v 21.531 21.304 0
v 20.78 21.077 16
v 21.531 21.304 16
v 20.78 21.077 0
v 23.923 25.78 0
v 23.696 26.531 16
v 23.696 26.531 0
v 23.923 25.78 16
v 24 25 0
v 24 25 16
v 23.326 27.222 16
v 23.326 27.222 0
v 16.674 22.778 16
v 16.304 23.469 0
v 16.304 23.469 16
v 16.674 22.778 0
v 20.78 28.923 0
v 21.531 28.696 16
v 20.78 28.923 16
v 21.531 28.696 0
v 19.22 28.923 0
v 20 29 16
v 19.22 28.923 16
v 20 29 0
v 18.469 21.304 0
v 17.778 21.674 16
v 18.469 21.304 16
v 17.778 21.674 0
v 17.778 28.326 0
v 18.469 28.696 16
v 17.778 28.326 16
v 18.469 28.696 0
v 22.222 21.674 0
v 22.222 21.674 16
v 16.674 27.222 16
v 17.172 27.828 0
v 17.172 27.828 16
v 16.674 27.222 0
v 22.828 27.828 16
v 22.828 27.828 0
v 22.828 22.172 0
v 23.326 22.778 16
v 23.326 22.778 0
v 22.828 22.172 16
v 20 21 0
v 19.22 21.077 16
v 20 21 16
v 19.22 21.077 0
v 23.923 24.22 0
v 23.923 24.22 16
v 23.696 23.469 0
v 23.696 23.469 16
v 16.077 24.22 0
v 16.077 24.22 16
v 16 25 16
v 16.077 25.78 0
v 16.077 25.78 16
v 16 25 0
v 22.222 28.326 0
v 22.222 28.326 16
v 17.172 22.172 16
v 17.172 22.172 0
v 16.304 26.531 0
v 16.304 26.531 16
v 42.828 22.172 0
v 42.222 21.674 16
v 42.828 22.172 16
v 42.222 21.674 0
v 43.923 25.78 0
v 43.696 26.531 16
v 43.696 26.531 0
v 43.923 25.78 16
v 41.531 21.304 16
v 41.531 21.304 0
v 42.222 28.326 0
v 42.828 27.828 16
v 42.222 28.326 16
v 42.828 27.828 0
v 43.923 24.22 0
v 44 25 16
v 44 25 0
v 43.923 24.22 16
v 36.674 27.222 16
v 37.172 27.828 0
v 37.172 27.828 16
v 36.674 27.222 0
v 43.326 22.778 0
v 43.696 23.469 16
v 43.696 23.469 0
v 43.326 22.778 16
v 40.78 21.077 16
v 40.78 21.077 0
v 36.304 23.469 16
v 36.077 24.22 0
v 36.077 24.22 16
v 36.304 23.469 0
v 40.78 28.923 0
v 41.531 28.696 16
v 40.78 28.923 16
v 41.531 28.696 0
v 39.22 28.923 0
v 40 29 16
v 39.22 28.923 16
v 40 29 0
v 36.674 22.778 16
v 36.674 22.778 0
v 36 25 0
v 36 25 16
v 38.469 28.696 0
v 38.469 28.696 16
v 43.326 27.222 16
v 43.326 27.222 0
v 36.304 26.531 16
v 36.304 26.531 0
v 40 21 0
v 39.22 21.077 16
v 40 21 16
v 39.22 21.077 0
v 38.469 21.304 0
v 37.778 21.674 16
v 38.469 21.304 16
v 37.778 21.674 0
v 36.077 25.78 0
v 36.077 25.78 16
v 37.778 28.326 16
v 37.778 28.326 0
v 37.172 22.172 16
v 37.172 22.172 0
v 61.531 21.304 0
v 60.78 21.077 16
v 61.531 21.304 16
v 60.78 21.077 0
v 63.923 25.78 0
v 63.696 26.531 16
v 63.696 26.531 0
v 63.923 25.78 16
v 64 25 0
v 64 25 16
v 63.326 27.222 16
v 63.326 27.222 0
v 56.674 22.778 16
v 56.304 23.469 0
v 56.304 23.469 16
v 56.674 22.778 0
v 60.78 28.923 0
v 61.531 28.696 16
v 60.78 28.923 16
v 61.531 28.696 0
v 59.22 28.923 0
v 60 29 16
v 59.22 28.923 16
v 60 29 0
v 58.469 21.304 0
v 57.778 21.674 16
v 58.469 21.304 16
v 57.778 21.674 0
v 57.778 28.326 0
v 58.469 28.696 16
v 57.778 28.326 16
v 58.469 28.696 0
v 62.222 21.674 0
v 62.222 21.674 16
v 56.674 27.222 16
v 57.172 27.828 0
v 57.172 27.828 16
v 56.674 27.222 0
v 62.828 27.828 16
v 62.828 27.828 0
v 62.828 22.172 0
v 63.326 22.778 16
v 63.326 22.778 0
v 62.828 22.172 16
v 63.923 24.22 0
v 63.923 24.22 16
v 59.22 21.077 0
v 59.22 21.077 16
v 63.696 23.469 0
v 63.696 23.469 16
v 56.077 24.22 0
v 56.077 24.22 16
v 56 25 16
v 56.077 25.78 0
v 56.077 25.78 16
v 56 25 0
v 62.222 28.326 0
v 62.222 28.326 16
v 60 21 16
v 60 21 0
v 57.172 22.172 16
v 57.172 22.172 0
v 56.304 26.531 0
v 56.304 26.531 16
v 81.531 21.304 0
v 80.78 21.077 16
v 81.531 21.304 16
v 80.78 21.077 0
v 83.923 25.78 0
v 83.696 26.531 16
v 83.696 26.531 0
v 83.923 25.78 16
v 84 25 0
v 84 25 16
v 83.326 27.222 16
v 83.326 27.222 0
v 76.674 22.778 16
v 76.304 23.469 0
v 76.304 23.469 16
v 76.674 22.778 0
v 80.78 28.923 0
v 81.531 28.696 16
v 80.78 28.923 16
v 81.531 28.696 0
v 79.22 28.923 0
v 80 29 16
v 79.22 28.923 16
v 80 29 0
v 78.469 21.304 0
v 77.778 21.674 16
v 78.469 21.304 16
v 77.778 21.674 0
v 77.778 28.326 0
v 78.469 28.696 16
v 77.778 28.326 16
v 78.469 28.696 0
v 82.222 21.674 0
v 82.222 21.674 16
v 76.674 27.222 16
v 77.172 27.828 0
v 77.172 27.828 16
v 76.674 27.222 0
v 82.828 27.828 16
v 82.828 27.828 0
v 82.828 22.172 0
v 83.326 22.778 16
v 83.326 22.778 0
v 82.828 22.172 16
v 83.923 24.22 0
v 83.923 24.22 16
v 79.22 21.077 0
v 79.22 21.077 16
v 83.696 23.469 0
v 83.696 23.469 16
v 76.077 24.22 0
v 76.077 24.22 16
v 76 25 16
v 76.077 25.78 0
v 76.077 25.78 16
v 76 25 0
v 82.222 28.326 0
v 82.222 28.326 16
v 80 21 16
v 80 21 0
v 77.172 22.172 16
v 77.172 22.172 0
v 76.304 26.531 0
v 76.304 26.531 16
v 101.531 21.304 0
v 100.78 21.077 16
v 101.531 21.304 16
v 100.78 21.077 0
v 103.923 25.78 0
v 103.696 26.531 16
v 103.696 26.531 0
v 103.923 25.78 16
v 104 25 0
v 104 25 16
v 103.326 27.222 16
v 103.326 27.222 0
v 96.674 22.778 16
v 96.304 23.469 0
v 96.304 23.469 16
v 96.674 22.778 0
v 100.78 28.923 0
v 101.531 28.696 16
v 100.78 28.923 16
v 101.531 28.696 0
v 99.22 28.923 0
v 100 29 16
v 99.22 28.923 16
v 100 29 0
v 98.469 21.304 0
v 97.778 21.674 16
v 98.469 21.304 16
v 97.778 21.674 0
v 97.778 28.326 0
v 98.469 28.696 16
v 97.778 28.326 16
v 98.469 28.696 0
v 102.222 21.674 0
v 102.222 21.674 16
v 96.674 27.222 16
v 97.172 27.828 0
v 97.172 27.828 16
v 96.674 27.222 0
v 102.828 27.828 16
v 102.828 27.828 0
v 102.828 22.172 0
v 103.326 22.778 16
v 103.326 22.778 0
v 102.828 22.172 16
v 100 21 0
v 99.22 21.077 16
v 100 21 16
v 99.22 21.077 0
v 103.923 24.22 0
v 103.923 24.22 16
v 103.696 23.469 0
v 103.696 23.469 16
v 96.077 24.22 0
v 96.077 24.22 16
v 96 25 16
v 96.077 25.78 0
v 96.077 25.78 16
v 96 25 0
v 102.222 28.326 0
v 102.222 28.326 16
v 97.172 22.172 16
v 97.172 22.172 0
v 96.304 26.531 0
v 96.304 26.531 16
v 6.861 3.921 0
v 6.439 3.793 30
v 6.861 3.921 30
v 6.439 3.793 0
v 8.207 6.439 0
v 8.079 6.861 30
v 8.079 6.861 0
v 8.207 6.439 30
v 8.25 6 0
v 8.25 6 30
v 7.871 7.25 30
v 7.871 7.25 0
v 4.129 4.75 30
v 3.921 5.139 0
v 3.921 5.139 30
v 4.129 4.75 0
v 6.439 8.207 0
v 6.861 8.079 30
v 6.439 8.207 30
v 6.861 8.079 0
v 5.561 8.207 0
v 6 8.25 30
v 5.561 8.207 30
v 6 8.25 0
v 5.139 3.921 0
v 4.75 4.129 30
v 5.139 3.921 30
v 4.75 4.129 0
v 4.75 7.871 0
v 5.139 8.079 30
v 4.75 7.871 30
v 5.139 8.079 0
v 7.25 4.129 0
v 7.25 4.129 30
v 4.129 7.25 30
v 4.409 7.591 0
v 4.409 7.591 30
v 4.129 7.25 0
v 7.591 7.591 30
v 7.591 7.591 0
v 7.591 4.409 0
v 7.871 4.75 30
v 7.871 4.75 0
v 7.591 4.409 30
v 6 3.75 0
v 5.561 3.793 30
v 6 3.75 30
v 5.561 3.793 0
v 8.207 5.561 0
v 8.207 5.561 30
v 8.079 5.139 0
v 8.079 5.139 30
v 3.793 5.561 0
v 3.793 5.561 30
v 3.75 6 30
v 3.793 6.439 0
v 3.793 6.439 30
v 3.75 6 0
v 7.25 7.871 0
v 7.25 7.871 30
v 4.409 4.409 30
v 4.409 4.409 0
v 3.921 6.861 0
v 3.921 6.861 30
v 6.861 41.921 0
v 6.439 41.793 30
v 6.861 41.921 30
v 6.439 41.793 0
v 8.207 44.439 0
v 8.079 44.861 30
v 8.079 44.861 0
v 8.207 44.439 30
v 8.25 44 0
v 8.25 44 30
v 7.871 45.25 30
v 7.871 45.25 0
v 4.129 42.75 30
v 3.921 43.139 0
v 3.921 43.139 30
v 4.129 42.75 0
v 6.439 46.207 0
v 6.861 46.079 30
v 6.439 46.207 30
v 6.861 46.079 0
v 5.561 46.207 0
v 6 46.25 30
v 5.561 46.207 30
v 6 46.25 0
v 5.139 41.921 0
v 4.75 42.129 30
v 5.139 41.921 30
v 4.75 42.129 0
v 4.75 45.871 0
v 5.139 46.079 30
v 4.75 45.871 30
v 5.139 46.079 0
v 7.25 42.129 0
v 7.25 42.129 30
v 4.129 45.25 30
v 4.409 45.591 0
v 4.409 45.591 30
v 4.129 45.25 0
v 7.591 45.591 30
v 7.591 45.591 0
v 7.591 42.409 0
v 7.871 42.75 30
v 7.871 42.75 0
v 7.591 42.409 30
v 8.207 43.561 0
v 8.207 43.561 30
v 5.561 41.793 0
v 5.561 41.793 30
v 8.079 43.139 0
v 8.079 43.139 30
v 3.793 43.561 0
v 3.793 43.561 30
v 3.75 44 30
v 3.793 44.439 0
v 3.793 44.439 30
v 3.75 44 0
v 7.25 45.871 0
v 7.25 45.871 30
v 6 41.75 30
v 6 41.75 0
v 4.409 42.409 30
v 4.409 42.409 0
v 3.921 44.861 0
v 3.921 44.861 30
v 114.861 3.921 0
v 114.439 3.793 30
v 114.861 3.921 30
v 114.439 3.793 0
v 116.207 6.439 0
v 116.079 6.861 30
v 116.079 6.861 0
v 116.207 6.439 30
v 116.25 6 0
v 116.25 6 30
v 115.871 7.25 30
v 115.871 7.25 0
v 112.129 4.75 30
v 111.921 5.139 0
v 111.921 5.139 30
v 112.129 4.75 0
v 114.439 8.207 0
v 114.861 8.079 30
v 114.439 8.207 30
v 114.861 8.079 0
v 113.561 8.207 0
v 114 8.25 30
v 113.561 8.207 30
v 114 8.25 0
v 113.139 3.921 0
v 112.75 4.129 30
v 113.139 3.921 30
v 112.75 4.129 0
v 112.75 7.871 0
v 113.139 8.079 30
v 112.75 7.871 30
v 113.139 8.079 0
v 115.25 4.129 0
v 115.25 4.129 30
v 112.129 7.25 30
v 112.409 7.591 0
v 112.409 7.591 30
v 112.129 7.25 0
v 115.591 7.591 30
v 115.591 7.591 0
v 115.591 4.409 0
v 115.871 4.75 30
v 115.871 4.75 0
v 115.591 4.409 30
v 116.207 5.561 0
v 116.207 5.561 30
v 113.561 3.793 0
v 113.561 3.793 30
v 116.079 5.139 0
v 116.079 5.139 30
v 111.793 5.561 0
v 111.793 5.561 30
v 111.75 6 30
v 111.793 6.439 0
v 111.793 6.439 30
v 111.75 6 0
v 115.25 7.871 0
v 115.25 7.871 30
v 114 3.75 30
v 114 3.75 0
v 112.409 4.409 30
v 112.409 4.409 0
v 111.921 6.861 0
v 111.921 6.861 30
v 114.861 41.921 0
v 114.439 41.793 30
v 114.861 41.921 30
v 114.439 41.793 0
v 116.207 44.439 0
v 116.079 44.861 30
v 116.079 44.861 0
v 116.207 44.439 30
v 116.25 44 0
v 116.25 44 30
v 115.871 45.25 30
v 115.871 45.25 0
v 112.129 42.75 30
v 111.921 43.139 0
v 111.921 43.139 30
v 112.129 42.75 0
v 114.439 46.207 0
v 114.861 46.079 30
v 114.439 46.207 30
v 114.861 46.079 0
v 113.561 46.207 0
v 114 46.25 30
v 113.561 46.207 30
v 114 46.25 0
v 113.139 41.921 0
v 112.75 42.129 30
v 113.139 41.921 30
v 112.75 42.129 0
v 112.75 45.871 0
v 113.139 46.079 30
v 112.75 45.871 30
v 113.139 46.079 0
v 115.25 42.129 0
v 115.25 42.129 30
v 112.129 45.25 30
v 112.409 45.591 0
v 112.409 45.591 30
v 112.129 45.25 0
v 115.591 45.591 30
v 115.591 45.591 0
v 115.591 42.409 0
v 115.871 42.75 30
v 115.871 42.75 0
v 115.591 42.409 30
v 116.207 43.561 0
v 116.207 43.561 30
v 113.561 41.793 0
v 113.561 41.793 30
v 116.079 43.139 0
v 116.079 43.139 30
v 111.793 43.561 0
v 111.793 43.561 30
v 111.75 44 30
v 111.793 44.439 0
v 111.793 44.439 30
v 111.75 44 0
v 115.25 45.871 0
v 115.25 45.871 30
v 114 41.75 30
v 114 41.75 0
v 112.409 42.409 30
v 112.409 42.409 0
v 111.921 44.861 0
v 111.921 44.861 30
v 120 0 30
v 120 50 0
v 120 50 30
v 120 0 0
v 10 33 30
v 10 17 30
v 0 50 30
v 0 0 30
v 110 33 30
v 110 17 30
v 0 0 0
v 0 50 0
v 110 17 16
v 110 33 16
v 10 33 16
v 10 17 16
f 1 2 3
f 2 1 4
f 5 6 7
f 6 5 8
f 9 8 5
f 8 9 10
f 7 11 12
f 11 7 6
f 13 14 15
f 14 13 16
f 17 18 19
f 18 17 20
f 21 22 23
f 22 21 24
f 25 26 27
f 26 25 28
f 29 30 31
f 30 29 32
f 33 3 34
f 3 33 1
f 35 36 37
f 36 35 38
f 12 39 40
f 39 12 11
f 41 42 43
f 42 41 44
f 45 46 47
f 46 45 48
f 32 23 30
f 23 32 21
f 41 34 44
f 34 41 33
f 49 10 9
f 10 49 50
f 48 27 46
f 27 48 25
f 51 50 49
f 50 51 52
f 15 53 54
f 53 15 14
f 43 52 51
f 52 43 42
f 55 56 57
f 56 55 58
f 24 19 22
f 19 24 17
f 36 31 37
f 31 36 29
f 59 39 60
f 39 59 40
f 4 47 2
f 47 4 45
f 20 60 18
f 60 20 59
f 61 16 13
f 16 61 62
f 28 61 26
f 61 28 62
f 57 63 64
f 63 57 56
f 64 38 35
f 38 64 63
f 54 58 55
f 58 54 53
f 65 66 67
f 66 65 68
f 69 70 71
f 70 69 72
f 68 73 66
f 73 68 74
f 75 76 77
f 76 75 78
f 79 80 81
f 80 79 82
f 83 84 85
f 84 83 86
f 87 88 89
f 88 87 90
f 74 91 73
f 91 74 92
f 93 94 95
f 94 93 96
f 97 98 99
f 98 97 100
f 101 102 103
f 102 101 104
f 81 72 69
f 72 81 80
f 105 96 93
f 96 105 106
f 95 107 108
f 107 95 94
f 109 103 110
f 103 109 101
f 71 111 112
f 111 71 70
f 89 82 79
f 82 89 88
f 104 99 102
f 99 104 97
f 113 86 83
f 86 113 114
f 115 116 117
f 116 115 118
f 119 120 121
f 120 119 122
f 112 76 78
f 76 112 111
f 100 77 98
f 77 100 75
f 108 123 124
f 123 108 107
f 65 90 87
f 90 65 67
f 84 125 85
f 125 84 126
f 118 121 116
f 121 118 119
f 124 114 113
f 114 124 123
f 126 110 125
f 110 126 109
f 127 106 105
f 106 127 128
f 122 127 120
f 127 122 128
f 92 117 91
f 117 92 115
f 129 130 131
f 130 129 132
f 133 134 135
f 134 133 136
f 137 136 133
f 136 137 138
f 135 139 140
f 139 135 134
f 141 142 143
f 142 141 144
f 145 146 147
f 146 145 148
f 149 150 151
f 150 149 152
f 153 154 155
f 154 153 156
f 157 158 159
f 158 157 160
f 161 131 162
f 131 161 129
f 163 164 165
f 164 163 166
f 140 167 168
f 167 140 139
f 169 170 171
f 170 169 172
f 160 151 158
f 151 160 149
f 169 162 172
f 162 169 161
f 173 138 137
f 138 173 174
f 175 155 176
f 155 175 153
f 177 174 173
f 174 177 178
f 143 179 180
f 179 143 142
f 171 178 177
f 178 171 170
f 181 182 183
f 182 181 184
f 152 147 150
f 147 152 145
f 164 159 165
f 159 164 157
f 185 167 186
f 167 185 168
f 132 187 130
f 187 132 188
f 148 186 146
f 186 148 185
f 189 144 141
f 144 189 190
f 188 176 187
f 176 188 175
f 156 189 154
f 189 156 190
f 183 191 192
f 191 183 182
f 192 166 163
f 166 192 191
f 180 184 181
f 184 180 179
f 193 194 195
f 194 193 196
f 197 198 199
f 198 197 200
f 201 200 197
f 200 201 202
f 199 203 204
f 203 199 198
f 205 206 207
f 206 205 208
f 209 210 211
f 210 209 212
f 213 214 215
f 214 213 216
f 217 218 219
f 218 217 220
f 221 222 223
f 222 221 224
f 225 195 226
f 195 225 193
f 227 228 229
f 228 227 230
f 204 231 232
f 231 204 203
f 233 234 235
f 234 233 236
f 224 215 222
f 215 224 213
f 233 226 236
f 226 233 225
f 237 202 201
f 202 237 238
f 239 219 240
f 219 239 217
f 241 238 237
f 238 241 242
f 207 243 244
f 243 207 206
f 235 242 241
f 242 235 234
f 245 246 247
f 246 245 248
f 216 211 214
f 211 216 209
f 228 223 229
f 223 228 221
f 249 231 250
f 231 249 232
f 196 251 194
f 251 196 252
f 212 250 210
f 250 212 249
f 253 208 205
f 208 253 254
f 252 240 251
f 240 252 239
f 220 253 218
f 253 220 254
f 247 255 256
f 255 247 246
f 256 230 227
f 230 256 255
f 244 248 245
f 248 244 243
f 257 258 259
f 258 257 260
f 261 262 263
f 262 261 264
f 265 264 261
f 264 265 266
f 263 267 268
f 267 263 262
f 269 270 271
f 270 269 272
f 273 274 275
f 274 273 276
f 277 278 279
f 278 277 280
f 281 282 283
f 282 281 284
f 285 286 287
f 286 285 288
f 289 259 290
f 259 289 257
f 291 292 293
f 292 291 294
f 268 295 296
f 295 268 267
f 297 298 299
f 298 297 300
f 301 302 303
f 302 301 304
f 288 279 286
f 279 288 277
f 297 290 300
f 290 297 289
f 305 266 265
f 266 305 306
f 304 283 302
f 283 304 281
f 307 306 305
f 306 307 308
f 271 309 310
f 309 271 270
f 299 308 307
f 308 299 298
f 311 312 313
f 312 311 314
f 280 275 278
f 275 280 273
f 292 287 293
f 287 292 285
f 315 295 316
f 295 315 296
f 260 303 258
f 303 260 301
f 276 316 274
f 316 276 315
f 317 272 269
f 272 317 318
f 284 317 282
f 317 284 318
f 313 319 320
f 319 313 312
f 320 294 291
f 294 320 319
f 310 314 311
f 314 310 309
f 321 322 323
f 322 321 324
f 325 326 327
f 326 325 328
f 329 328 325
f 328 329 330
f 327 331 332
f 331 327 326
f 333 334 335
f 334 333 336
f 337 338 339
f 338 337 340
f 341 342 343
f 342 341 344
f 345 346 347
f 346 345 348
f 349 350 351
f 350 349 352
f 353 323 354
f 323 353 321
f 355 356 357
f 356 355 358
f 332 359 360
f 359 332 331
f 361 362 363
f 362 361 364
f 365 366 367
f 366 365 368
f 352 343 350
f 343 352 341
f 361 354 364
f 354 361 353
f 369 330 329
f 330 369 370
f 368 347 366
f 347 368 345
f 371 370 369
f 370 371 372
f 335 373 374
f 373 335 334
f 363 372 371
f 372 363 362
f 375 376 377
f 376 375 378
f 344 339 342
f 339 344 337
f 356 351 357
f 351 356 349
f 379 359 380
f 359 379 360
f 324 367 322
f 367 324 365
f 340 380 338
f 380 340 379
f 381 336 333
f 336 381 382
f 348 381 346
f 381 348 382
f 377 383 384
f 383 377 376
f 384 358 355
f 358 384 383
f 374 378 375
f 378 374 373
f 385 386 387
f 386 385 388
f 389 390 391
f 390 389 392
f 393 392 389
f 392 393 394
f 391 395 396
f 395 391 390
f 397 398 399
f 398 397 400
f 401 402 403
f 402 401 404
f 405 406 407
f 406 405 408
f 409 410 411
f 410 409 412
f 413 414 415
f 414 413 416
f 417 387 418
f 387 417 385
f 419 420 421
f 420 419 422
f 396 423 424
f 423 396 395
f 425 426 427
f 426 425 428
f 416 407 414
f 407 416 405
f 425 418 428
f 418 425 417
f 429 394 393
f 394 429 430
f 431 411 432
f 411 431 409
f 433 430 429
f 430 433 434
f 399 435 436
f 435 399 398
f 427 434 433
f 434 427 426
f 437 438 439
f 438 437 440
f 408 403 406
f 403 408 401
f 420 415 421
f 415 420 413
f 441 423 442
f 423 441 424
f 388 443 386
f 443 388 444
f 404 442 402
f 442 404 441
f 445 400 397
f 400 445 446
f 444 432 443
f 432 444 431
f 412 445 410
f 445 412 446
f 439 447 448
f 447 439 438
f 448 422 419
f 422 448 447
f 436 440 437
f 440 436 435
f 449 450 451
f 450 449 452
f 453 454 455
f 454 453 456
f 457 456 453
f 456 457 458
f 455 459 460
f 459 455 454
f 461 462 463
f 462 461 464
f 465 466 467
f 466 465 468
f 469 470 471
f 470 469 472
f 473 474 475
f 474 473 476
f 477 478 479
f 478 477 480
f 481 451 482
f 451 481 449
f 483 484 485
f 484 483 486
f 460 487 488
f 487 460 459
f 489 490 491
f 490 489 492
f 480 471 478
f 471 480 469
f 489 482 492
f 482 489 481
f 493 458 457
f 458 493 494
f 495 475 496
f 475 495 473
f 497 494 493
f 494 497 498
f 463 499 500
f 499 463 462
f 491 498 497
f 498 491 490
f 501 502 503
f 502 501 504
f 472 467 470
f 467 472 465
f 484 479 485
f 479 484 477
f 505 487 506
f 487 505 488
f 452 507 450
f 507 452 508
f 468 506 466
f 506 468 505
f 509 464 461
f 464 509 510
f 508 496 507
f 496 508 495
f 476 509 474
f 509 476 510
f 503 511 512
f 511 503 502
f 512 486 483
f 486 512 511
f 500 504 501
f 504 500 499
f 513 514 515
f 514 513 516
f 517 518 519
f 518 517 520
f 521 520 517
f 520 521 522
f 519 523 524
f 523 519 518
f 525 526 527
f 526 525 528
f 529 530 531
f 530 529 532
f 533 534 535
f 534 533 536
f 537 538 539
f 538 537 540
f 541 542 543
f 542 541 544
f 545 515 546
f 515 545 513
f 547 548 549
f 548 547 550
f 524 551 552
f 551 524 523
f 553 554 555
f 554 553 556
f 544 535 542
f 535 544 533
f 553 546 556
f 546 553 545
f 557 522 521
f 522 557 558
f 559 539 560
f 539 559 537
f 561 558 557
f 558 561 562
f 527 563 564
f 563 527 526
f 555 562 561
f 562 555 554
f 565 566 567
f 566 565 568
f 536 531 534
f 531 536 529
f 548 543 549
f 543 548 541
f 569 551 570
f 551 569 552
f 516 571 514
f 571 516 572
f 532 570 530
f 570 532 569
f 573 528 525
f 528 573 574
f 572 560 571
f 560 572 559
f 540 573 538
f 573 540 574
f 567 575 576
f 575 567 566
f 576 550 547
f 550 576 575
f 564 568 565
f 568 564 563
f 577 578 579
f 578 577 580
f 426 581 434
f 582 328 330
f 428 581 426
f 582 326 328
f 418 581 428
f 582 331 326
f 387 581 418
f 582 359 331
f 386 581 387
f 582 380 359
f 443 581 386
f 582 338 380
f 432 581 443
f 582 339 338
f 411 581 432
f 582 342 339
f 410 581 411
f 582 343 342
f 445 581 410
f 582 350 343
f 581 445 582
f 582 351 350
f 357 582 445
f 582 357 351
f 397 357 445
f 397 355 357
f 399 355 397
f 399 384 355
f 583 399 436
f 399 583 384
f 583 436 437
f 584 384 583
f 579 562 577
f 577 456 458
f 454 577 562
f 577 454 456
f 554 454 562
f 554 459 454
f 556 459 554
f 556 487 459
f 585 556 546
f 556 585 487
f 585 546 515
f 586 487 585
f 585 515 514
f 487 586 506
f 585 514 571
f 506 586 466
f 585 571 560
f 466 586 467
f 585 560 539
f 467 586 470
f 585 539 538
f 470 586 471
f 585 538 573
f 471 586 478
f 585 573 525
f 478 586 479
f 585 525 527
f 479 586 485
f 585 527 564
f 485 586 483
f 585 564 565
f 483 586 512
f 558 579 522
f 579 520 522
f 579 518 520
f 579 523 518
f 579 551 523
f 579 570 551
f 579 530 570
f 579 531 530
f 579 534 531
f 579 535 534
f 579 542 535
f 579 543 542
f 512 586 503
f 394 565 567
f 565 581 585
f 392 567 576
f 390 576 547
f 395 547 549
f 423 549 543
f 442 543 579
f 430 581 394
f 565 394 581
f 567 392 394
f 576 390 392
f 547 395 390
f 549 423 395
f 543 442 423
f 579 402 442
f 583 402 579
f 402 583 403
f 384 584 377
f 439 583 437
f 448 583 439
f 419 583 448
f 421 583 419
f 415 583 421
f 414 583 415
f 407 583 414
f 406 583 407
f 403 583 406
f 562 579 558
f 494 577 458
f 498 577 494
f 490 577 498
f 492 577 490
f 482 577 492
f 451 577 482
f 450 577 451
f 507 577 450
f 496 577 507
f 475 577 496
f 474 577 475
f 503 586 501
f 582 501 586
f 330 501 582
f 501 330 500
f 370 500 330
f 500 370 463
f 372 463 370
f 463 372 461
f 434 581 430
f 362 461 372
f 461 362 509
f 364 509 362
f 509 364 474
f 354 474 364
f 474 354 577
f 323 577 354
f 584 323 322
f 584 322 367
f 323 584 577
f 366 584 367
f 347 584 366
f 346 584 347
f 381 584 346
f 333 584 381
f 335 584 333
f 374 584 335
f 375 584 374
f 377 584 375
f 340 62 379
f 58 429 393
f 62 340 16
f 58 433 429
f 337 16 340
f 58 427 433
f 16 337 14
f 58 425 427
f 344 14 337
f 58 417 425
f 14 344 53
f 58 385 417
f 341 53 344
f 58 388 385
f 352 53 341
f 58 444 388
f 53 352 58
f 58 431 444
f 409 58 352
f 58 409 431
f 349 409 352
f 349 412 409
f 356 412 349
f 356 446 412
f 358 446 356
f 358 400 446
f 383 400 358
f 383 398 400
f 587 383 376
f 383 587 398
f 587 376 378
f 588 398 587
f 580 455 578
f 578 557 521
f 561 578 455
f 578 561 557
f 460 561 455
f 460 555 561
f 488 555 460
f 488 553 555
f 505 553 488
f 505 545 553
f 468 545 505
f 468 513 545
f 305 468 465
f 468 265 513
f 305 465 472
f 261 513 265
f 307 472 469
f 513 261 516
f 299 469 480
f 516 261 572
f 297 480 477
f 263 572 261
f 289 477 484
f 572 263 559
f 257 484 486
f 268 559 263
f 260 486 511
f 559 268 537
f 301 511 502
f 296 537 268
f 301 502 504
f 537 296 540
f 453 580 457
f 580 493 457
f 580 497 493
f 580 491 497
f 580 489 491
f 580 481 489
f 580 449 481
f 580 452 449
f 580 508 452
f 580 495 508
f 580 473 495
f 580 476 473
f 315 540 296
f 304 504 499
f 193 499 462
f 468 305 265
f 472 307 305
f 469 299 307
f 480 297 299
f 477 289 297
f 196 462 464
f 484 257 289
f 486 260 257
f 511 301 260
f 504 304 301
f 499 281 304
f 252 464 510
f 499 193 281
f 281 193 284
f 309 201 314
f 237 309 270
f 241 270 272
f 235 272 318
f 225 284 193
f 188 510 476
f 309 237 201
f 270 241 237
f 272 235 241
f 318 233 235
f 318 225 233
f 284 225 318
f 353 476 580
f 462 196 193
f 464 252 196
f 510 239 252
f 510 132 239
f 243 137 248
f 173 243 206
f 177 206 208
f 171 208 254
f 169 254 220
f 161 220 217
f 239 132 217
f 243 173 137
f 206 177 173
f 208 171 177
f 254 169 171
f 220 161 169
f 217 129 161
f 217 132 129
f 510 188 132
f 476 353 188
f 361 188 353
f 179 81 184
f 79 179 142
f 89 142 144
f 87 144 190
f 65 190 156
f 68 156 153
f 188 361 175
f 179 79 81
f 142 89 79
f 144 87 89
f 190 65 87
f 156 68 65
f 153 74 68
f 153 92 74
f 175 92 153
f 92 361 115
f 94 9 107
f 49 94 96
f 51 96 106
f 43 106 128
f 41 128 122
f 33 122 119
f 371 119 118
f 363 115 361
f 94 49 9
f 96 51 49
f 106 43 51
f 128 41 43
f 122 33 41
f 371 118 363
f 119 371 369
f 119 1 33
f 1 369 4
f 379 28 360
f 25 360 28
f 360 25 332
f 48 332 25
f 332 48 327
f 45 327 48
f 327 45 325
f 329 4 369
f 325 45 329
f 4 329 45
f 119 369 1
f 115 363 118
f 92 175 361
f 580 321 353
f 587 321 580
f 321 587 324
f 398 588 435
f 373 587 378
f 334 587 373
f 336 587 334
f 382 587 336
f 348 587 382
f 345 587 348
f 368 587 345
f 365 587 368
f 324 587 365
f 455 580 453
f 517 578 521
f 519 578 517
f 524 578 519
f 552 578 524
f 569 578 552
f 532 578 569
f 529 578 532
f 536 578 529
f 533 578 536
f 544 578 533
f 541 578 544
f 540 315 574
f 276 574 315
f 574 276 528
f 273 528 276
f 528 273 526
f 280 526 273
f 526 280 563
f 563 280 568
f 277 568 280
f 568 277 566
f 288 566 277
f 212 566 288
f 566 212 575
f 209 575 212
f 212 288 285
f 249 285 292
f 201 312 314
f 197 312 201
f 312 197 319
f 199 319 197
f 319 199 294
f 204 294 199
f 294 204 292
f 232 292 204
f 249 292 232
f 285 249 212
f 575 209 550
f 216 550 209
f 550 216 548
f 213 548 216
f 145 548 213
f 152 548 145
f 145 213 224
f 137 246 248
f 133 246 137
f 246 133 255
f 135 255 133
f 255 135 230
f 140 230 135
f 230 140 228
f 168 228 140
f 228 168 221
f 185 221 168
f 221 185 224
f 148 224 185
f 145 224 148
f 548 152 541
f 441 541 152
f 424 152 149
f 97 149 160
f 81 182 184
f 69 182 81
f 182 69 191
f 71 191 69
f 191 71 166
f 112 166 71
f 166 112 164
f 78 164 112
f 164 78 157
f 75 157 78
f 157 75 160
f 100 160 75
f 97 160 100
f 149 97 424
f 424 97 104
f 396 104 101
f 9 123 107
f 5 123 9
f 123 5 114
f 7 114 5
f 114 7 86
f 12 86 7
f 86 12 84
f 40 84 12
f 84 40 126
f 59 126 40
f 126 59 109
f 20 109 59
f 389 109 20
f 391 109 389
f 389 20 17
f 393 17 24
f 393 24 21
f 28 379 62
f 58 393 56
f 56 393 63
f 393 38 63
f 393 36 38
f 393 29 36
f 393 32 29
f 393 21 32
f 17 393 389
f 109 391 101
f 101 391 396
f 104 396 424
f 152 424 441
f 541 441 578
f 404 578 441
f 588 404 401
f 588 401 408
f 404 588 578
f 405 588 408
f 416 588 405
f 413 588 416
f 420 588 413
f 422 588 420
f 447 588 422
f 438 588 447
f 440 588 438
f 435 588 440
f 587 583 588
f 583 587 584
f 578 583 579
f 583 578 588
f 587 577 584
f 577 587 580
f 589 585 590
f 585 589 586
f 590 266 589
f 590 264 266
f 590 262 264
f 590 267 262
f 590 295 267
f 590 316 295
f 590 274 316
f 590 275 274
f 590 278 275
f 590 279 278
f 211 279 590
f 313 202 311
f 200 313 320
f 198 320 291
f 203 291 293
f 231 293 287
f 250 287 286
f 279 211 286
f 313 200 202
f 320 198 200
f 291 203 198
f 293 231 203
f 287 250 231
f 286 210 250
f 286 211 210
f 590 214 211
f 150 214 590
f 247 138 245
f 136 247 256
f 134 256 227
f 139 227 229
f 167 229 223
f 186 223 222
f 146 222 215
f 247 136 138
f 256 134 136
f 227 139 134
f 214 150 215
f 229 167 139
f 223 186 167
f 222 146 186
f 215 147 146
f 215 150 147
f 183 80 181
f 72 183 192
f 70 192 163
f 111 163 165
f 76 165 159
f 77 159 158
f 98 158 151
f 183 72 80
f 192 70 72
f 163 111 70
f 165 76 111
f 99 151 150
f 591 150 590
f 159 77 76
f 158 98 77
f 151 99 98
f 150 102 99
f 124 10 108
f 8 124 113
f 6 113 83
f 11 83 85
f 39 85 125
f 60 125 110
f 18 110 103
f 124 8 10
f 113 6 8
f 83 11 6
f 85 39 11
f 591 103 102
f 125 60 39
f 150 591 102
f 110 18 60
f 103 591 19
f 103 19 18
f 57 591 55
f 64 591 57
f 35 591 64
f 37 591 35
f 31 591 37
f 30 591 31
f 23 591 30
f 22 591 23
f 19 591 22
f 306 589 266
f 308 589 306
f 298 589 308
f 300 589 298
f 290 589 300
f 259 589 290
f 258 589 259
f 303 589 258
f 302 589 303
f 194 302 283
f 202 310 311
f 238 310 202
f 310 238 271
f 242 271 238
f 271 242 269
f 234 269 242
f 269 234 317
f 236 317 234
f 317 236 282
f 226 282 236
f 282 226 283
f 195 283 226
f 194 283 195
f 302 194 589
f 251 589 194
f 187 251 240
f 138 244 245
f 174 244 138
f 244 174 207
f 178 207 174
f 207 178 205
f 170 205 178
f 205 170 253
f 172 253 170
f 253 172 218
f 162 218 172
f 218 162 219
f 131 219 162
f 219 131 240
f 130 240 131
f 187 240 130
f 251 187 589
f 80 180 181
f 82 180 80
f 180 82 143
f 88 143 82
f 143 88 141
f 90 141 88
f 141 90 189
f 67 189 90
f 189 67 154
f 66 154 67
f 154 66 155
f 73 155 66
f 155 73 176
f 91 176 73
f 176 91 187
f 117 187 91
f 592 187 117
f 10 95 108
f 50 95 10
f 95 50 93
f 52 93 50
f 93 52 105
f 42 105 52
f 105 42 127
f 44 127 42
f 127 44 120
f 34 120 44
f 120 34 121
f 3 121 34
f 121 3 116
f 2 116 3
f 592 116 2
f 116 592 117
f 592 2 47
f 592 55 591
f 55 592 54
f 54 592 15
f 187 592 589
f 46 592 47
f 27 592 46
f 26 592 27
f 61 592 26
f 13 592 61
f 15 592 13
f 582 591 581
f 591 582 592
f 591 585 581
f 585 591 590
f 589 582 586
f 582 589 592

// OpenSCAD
$fn = 32;

// ----------------------------------------------------------------------
// Manifold block: gallery_top manifold
// ----------------------------------------------------------------------

// --- parameters (mm) ---
block_l = 120;            // block length, X
block_w = 50;             // block width, Y
block_h = 30;             // block height, Z
port_d = 8;               // port bore diameter
port_pitch = 20;          // port pitch along X
gallery_d = 16;           // top gallery width, Y
gallery_depth = 14;       // gallery pocket depth
wall_p = 10;              // gallery end wall thickness, X
mnt_d = 4.5;              // mounting hole diameter
mnt_in = 6;               // mounting hole inset from the edges

n_ports = 5;  // ports in the row
port_x0 = (block_l - (n_ports - 1) * port_pitch) / 2;  // first port X

difference() {
  cube([block_l, block_w, block_h]);
  for (i = [0 : n_ports - 1])
    translate([port_x0 + i * port_pitch, block_w / 2, -1])
      cylinder(h = block_h + 2, d = port_d);
  translate([wall_p, block_w / 2 - gallery_d / 2, block_h - gallery_depth])
    cube([block_l - 2 * wall_p, gallery_d, gallery_depth + 1]);
  for (cx = [mnt_in, block_l - mnt_in])
    for (cy = [mnt_in, block_w - mnt_in])
      translate([cx, cy, -1]) cylinder(h = block_h + 2, d = mnt_d);
}
